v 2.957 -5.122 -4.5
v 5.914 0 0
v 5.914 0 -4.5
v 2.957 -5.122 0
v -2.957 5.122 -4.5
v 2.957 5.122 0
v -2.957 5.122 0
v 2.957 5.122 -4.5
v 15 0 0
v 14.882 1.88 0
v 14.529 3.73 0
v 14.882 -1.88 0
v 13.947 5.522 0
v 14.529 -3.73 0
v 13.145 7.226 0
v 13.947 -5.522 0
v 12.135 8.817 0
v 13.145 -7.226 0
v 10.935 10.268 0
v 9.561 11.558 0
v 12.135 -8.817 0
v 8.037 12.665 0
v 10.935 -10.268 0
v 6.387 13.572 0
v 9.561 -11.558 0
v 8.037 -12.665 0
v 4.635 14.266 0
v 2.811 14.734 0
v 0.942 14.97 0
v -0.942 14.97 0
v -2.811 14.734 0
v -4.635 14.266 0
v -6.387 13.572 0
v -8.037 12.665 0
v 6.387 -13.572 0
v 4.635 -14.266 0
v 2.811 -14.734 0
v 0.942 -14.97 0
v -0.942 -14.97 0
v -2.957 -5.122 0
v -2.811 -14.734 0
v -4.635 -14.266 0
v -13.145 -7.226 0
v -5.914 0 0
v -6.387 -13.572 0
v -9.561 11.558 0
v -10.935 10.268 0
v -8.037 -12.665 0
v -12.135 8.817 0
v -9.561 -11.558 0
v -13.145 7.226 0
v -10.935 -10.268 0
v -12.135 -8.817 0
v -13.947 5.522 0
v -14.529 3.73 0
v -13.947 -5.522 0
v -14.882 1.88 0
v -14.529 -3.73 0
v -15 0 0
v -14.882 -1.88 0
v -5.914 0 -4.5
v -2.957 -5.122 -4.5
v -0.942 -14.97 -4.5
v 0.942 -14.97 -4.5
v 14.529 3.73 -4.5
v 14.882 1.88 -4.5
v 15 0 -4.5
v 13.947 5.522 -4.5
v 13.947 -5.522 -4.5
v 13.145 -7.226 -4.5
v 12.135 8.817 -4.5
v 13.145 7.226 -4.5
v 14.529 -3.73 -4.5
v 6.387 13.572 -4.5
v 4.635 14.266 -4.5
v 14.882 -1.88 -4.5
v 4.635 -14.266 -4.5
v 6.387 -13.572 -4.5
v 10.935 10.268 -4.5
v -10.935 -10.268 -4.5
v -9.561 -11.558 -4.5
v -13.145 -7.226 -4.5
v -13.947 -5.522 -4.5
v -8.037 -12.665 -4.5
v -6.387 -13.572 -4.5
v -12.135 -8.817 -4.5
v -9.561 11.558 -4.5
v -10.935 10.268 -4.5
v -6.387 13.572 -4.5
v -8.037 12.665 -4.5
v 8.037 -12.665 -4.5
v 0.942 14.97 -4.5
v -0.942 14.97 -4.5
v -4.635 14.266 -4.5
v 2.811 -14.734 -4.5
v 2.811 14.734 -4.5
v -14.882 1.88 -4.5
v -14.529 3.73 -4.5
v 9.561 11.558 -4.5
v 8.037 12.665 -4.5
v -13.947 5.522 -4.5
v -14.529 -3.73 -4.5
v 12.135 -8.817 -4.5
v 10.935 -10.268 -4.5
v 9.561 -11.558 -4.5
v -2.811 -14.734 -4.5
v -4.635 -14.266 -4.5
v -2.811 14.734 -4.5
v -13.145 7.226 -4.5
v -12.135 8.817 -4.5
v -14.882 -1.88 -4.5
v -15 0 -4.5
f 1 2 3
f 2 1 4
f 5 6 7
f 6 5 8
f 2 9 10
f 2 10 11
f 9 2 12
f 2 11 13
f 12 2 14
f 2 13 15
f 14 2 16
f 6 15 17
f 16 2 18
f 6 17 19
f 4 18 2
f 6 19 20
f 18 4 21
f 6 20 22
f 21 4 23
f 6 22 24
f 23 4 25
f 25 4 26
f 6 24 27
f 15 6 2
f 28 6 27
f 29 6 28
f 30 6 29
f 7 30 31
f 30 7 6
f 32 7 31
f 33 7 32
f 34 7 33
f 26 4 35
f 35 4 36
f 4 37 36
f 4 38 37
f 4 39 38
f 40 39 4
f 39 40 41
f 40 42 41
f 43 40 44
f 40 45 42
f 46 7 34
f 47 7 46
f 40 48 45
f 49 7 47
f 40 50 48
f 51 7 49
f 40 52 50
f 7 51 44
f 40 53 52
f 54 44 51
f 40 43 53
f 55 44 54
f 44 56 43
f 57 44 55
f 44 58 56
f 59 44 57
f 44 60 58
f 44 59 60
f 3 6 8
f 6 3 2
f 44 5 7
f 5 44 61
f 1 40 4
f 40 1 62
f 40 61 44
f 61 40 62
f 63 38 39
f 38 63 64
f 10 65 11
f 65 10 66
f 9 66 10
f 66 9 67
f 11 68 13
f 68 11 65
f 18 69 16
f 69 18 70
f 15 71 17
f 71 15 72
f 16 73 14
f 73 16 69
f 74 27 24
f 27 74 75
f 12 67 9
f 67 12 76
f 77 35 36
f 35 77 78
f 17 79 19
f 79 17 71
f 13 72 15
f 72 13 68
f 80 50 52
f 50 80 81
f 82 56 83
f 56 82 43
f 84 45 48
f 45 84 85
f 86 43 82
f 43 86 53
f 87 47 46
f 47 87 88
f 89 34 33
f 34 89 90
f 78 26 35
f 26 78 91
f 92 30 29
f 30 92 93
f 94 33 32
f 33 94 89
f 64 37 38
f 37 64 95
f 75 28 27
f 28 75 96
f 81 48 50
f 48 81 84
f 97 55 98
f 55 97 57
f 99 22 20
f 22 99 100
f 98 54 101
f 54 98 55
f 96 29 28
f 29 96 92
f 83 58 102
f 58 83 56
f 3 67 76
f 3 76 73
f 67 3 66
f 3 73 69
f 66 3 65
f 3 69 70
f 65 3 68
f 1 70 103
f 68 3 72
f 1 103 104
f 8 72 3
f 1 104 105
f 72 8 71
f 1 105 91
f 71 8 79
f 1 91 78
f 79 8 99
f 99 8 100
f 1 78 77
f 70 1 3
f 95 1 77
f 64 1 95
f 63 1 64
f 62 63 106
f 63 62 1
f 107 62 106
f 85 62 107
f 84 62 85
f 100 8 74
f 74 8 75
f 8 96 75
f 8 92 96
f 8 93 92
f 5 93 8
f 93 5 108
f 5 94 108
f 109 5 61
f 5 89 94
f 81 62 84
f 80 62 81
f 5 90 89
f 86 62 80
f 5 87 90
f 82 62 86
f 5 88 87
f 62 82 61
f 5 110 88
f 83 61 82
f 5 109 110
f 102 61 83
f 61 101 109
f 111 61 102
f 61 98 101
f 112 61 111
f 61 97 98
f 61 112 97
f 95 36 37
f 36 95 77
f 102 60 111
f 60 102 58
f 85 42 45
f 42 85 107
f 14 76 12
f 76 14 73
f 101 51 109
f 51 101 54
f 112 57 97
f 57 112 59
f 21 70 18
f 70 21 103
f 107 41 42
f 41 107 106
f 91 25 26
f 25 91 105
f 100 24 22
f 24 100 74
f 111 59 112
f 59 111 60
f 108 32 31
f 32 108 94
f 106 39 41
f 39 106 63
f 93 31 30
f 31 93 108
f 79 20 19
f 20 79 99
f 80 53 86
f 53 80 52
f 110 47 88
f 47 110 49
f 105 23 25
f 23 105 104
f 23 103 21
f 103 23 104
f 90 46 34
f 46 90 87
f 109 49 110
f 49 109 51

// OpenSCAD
$fn = 50;


difference() {
	union() {
		translate(v = [0, 0, -4.5000000000]) {
			cylinder(h = 4.5000000000, r = 15.0000000000);
		}
	}
	union() {
		translate(v = [0, 0, 0]) {
			rotate(a = [0, 0, 0]) {
				difference() {
					union() {
						translate(v = [0, 0, -5]) {
							linear_extrude(height = 5) {
								polygon(points = [[5.9142500000, 0.0000000000], [2.9571250000, 5.1218907443], [-2.9571250000, 5.1218907443], [-5.9142500000, 0.0000000000], [-2.9571250000, -5.1218907443], [2.9571250000, -5.1218907443]]);
							}
						}
					}
					union();
				}
			}
		}
		#translate(v = [0, 0, -100.0000000000]) {
			cylinder(h = 200, r = 3.2500000000);
		}
	}
}
